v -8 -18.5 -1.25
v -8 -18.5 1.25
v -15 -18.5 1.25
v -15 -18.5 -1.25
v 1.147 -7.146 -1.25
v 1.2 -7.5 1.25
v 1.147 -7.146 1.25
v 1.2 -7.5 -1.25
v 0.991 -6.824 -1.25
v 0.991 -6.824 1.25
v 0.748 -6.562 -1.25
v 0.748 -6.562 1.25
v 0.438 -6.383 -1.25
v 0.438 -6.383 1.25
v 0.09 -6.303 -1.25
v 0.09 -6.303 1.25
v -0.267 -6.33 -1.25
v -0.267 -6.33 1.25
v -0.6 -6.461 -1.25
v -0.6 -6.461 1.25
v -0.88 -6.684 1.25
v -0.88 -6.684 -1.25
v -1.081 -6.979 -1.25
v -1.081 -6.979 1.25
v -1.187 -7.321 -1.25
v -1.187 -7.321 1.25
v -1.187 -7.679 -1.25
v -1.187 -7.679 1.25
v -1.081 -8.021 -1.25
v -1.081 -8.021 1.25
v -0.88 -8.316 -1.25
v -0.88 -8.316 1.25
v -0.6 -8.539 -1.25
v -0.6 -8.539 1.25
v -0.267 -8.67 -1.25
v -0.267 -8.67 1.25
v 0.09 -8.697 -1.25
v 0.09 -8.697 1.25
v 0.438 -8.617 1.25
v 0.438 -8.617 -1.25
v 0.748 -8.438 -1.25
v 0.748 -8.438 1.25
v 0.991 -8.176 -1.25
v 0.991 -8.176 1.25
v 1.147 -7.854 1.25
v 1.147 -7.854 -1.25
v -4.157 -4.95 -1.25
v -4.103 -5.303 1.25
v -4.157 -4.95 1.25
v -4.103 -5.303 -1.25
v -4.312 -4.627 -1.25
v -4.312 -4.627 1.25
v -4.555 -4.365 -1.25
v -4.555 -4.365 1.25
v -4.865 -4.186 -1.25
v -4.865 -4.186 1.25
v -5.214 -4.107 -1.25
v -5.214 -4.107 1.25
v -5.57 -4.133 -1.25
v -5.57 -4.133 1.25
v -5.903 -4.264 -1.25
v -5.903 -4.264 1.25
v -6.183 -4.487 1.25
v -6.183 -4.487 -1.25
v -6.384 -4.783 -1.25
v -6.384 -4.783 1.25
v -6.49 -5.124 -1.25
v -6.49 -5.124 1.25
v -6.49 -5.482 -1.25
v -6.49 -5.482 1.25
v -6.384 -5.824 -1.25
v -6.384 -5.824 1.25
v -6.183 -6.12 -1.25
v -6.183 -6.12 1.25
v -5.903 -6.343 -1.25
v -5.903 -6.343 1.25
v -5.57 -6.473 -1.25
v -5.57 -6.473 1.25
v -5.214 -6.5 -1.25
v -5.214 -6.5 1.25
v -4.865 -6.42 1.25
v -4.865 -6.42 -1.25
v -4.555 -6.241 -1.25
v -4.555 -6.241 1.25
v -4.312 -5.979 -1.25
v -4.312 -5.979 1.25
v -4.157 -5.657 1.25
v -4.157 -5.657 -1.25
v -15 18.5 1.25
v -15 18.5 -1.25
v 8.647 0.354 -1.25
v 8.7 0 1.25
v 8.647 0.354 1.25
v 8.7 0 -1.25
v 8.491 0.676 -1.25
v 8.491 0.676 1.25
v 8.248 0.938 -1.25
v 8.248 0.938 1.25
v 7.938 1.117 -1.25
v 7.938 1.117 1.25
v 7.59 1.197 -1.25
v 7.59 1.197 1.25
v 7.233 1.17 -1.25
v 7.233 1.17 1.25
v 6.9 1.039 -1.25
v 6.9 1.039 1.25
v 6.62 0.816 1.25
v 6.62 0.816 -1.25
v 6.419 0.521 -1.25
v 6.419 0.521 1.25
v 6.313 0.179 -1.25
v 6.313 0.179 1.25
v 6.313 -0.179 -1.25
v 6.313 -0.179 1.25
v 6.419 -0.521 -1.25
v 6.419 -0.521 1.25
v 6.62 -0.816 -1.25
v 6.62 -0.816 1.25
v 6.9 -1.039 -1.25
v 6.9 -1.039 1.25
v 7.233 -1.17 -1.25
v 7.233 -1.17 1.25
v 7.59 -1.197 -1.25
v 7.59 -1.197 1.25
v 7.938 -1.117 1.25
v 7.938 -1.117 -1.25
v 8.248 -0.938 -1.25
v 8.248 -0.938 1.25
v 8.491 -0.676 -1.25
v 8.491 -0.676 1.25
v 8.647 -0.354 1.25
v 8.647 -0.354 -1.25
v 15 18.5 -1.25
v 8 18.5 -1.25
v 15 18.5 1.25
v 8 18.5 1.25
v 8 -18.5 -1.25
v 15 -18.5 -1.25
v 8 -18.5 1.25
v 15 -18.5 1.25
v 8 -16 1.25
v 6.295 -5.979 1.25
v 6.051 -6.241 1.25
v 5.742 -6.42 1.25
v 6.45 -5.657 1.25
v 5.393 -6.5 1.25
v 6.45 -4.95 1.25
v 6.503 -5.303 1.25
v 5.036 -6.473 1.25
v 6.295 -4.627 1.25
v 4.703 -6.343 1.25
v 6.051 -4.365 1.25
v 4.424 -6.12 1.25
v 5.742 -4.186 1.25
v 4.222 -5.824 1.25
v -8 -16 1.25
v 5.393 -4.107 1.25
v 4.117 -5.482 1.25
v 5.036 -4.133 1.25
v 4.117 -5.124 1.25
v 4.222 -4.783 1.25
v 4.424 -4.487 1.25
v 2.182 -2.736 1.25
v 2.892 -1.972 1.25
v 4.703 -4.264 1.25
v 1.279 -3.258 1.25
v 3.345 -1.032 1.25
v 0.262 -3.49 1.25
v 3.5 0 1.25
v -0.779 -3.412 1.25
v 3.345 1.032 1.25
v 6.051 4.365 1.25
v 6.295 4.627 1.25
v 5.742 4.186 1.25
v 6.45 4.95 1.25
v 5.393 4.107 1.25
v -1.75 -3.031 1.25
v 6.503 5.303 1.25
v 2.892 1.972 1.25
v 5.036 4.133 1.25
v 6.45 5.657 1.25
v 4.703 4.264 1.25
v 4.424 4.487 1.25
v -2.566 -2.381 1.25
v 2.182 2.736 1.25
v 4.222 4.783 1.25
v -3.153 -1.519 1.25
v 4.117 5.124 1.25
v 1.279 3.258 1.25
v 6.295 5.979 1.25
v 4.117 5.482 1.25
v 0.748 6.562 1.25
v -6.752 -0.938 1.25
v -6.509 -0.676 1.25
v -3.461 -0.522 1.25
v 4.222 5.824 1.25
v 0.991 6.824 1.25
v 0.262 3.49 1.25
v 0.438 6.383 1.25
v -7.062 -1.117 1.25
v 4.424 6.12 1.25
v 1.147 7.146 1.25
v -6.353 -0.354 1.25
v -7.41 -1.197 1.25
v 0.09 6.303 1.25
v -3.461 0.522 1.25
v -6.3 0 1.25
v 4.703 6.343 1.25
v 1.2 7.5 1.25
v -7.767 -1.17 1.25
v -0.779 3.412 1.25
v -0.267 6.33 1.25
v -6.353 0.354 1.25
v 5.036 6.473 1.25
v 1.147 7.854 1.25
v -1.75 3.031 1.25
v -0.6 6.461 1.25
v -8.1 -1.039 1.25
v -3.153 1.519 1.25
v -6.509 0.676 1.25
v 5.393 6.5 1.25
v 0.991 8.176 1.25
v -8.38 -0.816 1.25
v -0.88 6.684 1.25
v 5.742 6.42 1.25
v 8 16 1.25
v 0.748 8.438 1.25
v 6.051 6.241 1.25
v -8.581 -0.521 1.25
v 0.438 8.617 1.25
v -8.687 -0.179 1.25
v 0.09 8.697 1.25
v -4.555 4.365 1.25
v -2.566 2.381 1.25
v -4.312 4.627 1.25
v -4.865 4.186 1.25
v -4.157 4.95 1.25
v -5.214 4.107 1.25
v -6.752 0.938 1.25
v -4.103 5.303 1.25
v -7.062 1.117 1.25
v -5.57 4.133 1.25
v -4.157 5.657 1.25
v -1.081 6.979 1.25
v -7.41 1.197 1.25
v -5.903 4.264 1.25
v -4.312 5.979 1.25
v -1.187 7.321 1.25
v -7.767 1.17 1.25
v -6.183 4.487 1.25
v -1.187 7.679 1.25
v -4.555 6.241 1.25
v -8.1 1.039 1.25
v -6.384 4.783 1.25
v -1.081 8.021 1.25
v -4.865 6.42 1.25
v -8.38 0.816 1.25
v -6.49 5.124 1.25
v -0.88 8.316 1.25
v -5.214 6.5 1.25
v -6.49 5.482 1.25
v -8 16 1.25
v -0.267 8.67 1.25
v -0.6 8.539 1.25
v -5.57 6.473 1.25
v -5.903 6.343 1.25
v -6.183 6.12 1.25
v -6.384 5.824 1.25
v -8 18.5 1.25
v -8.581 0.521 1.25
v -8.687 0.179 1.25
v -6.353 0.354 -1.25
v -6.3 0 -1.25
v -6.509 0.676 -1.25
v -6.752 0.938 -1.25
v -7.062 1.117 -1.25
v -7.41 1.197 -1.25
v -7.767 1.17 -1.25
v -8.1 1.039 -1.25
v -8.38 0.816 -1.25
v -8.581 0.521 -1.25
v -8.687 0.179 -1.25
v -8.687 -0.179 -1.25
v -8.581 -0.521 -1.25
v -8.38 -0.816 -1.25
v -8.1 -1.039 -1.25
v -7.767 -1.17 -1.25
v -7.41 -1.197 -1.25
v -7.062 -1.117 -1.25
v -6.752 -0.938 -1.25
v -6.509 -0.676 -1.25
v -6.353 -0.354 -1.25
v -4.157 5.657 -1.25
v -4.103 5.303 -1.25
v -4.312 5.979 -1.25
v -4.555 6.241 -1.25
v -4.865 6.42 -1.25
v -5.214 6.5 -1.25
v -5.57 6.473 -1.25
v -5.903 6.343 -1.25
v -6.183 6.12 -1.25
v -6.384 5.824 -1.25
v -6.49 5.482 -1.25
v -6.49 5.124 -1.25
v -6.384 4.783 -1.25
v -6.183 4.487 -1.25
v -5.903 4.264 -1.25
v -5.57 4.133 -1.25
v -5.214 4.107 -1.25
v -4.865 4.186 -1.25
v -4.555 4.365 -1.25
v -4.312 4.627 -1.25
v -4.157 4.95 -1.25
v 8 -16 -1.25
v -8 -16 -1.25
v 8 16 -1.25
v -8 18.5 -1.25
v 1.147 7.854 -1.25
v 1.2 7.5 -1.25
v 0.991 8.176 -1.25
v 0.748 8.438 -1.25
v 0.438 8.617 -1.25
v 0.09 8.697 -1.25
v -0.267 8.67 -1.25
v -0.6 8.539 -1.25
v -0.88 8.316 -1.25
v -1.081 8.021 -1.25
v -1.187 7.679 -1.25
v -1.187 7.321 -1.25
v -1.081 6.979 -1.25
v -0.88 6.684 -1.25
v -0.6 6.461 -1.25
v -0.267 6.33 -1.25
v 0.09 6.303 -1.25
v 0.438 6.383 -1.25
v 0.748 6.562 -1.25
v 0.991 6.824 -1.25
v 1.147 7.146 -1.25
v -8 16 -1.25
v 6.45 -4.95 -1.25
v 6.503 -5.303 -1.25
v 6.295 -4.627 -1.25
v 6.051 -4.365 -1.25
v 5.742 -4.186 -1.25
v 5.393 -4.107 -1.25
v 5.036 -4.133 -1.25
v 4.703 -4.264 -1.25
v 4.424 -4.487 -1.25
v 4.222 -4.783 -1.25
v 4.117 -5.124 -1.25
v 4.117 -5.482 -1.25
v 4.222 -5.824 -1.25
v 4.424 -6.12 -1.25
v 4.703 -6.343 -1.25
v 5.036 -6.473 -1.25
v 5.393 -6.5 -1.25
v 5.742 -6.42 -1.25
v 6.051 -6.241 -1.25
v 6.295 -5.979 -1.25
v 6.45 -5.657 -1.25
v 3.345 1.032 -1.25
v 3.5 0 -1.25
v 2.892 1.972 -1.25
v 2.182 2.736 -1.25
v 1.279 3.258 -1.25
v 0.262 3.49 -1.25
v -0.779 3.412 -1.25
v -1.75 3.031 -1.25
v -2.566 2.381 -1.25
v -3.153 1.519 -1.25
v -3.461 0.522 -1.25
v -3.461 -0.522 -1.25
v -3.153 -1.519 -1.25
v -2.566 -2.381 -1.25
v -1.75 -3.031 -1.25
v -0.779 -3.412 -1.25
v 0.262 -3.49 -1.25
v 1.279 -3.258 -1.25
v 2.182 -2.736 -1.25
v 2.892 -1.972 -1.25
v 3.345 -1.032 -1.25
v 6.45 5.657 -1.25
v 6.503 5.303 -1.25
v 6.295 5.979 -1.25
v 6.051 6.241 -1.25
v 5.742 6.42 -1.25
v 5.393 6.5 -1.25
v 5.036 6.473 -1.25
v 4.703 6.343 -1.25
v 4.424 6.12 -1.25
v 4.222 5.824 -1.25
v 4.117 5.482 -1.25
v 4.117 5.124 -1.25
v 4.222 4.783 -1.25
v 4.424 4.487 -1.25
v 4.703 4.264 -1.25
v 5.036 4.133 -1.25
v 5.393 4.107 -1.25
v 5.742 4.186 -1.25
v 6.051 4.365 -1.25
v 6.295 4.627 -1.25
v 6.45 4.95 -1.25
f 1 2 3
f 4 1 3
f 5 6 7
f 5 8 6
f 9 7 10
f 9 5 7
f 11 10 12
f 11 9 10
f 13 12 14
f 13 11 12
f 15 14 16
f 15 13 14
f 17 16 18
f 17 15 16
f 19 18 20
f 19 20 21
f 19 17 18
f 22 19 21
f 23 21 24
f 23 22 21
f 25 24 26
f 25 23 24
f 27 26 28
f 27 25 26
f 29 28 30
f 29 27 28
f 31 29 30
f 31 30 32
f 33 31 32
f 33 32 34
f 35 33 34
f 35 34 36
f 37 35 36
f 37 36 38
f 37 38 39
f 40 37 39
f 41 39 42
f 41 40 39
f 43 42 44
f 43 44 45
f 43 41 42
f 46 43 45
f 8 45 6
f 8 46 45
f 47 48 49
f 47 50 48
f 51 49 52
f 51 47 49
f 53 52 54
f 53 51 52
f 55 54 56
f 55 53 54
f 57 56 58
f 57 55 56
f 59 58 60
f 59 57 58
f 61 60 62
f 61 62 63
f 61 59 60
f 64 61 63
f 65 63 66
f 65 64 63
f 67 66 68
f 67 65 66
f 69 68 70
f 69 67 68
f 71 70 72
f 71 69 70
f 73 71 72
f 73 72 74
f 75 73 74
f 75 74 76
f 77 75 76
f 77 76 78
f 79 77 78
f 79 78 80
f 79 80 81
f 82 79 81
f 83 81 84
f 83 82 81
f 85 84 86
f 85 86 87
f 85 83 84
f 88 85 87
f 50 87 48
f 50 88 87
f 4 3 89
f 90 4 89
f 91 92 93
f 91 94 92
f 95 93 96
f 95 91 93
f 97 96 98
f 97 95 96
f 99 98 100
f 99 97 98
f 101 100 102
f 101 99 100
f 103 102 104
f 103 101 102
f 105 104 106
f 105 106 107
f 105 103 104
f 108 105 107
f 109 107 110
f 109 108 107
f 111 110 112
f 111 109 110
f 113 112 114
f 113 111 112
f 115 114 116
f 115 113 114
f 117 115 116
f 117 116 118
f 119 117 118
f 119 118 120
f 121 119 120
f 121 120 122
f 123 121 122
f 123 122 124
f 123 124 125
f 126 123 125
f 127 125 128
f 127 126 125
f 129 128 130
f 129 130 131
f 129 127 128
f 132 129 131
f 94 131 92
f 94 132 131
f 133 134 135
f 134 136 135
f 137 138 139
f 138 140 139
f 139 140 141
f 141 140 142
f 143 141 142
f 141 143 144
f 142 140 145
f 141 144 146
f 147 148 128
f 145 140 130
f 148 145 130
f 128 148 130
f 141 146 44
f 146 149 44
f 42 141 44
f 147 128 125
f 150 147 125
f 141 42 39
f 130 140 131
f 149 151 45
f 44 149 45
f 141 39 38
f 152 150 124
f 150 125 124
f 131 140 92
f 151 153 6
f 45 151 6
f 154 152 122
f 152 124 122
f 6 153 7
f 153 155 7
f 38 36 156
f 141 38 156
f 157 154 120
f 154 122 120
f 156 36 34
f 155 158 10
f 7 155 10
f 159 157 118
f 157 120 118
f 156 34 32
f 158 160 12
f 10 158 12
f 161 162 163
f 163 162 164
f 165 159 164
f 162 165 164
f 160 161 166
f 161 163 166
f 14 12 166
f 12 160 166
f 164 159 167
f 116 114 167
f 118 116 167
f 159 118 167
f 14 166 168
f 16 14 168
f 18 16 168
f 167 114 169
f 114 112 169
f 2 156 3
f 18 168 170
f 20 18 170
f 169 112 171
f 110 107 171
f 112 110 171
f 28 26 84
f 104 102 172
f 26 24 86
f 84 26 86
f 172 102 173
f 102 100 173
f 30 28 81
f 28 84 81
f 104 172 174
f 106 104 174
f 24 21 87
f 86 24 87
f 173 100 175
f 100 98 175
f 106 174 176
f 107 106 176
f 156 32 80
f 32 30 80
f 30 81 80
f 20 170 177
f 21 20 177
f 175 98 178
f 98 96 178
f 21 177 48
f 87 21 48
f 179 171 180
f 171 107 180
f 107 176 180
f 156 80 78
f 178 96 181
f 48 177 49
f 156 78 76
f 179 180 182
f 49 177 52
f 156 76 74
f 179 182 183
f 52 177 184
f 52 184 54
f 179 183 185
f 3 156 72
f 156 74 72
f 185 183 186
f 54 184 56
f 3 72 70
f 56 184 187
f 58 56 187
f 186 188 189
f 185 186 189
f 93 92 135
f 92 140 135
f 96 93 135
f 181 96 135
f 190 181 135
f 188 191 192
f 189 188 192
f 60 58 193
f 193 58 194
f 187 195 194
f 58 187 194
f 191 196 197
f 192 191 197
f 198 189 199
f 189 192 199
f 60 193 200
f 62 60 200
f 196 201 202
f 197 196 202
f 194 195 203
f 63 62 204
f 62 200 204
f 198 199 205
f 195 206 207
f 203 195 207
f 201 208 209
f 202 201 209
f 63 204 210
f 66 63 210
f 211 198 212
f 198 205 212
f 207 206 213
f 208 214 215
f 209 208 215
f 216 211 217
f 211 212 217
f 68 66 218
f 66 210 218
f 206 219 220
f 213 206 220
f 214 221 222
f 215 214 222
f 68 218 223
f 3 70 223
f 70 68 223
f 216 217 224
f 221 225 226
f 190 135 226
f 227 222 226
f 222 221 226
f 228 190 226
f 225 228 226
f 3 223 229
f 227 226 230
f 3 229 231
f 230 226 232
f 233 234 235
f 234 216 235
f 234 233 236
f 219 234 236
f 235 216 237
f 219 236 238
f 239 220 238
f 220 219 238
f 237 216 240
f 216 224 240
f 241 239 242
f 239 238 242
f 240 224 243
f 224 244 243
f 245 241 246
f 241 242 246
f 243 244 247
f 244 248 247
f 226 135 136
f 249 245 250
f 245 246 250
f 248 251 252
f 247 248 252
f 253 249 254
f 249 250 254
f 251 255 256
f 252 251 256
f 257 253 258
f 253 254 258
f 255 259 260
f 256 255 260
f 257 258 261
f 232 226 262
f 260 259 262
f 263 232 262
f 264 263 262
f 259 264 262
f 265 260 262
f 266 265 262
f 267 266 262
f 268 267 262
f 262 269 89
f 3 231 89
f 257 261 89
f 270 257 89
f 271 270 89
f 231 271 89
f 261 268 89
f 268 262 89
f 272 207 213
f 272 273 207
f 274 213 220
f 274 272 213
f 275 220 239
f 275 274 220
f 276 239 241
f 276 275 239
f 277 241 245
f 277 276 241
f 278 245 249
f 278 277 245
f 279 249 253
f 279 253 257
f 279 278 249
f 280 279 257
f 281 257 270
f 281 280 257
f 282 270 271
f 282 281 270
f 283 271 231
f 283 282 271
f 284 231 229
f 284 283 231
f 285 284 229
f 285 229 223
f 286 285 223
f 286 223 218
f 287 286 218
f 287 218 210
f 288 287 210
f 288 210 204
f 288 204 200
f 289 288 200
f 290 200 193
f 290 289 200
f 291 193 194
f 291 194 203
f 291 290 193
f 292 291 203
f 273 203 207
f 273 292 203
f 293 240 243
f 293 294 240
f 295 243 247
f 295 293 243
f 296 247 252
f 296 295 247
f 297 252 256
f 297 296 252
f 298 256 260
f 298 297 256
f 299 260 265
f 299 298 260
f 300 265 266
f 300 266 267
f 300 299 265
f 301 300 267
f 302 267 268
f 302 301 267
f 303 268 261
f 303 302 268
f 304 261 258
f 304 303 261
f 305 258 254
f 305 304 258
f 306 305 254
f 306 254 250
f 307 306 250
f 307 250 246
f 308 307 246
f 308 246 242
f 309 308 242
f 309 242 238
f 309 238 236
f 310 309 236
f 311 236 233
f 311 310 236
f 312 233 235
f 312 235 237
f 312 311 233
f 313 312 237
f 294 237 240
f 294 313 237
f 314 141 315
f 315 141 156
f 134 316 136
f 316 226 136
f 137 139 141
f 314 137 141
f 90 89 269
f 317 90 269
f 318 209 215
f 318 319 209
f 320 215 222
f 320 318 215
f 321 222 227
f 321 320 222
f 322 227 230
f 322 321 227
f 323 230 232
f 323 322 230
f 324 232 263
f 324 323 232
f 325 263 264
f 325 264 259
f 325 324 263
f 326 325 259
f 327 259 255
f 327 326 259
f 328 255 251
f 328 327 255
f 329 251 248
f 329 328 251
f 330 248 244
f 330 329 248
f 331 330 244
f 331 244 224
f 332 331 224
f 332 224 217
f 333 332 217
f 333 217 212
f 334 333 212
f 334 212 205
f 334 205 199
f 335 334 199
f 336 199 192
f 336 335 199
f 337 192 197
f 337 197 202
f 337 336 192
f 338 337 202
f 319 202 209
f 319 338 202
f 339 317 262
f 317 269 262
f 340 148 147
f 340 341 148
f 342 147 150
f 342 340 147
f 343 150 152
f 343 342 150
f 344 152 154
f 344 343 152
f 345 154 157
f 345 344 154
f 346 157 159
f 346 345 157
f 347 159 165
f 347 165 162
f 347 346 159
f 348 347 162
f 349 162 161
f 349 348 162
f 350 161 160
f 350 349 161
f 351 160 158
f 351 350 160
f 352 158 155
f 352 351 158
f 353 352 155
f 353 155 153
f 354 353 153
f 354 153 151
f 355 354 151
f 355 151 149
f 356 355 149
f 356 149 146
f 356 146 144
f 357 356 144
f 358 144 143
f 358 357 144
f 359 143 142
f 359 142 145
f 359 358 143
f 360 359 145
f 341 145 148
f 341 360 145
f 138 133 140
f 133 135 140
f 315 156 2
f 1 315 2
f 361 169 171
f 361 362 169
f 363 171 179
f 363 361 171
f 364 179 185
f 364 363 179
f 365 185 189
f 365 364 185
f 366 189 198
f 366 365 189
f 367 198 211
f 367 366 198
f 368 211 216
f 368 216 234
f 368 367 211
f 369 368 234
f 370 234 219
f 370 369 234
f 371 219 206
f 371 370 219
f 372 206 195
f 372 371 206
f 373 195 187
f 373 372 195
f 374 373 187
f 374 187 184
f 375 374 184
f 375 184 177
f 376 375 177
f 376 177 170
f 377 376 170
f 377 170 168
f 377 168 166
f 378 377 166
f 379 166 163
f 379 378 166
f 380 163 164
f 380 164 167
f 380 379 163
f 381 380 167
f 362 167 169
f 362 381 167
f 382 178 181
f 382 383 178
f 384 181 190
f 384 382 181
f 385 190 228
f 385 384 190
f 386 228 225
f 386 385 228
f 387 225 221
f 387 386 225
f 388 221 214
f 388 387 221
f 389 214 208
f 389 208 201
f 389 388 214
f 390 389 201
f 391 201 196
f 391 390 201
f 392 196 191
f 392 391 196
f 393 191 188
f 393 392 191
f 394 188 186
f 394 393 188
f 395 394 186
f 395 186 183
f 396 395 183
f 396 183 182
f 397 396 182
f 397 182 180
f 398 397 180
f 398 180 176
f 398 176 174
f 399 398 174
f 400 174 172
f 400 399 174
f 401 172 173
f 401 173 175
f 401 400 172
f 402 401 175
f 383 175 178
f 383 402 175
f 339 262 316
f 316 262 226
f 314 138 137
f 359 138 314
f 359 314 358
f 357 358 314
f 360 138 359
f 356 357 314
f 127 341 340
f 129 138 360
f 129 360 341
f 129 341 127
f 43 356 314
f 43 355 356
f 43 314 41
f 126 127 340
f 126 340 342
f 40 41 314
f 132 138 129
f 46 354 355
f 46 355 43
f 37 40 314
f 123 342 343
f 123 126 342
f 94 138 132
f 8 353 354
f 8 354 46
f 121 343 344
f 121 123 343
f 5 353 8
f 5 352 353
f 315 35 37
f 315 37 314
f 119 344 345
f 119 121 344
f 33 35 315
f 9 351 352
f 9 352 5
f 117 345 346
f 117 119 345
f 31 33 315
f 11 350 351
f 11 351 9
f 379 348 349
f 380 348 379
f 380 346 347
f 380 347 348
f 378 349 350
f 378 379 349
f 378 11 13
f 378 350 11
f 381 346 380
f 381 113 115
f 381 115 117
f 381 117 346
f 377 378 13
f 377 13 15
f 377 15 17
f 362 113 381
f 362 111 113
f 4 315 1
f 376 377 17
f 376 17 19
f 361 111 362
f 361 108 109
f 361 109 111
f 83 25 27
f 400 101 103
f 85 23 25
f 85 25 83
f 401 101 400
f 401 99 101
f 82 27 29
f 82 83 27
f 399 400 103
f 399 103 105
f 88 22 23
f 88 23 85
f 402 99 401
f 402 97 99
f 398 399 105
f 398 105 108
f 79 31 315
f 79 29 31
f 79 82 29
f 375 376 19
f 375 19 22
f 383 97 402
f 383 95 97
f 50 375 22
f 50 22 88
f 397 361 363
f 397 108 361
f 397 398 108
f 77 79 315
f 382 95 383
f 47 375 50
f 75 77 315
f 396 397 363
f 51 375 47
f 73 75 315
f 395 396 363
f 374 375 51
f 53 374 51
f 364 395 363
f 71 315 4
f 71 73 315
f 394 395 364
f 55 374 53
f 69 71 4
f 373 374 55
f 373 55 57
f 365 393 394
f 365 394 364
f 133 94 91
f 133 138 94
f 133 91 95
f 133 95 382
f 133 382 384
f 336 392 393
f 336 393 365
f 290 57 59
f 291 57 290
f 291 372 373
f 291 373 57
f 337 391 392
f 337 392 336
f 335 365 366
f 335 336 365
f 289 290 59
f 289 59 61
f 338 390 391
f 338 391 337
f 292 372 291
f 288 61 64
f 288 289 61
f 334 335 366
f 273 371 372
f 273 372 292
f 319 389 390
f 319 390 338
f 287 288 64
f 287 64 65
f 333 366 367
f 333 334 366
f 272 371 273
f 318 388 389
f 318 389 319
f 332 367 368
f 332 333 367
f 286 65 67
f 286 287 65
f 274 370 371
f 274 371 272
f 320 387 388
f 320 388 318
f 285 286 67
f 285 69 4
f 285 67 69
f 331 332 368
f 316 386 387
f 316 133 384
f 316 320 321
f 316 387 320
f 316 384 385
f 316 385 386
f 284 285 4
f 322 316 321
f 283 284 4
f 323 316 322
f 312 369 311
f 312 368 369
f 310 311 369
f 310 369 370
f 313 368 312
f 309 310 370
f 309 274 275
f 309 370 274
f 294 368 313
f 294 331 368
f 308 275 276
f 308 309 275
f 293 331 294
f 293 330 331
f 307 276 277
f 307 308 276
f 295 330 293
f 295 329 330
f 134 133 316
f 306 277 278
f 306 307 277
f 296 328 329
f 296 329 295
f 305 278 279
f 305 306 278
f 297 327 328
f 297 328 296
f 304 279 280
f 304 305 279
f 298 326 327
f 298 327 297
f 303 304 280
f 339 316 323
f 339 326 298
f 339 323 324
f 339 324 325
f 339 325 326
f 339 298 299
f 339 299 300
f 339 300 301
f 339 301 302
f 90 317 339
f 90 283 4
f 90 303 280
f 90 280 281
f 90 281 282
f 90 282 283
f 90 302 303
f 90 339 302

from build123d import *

# Parameters (mm, degrees)
CROQUIS1_R              = 3.5
CROQUIS1_R_2            = 1.2
SALIENTE_EXTRUIR1_DEPTH = 1.25


with BuildPart() as part:
    # Croquis1 → Saliente-Extruir1 (new body, symmetric)
    with BuildSketch(Plane.XY):
        Polygon((-15, 18.5), (-8, 18.5), (-8, 16), (8, 16), (8, 18.5), (15, 18.5), (15, -18.5), (8, -18.5), (8, -16), (-8, -16), (-8, -18.5), (-15, -18.5), align=None)
        Circle(CROQUIS1_R, mode=Mode.SUBTRACT)
        with Locations((0, 7.5)):
            Circle(CROQUIS1_R_2, mode=Mode.SUBTRACT)
        with Locations((5.303300859, 5.303300859)):
            Circle(CROQUIS1_R_2, mode=Mode.SUBTRACT)
        with Locations((7.5, 0)):
            Circle(CROQUIS1_R_2, mode=Mode.SUBTRACT)
        with Locations((5.303300859, -5.303300859)):
            Circle(CROQUIS1_R_2, mode=Mode.SUBTRACT)
        with Locations((0, -7.5)):
            Circle(CROQUIS1_R_2, mode=Mode.SUBTRACT)
        with Locations((-5.303300859, -5.303300859)):
            Circle(CROQUIS1_R_2, mode=Mode.SUBTRACT)
        with Locations((-7.5, 0)):
            Circle(CROQUIS1_R_2, mode=Mode.SUBTRACT)
        with Locations((-5.303300859, 5.303300859)):
            Circle(CROQUIS1_R_2, mode=Mode.SUBTRACT)
    extrude(amount=SALIENTE_EXTRUIR1_DEPTH, both=True)


solid = part.part
